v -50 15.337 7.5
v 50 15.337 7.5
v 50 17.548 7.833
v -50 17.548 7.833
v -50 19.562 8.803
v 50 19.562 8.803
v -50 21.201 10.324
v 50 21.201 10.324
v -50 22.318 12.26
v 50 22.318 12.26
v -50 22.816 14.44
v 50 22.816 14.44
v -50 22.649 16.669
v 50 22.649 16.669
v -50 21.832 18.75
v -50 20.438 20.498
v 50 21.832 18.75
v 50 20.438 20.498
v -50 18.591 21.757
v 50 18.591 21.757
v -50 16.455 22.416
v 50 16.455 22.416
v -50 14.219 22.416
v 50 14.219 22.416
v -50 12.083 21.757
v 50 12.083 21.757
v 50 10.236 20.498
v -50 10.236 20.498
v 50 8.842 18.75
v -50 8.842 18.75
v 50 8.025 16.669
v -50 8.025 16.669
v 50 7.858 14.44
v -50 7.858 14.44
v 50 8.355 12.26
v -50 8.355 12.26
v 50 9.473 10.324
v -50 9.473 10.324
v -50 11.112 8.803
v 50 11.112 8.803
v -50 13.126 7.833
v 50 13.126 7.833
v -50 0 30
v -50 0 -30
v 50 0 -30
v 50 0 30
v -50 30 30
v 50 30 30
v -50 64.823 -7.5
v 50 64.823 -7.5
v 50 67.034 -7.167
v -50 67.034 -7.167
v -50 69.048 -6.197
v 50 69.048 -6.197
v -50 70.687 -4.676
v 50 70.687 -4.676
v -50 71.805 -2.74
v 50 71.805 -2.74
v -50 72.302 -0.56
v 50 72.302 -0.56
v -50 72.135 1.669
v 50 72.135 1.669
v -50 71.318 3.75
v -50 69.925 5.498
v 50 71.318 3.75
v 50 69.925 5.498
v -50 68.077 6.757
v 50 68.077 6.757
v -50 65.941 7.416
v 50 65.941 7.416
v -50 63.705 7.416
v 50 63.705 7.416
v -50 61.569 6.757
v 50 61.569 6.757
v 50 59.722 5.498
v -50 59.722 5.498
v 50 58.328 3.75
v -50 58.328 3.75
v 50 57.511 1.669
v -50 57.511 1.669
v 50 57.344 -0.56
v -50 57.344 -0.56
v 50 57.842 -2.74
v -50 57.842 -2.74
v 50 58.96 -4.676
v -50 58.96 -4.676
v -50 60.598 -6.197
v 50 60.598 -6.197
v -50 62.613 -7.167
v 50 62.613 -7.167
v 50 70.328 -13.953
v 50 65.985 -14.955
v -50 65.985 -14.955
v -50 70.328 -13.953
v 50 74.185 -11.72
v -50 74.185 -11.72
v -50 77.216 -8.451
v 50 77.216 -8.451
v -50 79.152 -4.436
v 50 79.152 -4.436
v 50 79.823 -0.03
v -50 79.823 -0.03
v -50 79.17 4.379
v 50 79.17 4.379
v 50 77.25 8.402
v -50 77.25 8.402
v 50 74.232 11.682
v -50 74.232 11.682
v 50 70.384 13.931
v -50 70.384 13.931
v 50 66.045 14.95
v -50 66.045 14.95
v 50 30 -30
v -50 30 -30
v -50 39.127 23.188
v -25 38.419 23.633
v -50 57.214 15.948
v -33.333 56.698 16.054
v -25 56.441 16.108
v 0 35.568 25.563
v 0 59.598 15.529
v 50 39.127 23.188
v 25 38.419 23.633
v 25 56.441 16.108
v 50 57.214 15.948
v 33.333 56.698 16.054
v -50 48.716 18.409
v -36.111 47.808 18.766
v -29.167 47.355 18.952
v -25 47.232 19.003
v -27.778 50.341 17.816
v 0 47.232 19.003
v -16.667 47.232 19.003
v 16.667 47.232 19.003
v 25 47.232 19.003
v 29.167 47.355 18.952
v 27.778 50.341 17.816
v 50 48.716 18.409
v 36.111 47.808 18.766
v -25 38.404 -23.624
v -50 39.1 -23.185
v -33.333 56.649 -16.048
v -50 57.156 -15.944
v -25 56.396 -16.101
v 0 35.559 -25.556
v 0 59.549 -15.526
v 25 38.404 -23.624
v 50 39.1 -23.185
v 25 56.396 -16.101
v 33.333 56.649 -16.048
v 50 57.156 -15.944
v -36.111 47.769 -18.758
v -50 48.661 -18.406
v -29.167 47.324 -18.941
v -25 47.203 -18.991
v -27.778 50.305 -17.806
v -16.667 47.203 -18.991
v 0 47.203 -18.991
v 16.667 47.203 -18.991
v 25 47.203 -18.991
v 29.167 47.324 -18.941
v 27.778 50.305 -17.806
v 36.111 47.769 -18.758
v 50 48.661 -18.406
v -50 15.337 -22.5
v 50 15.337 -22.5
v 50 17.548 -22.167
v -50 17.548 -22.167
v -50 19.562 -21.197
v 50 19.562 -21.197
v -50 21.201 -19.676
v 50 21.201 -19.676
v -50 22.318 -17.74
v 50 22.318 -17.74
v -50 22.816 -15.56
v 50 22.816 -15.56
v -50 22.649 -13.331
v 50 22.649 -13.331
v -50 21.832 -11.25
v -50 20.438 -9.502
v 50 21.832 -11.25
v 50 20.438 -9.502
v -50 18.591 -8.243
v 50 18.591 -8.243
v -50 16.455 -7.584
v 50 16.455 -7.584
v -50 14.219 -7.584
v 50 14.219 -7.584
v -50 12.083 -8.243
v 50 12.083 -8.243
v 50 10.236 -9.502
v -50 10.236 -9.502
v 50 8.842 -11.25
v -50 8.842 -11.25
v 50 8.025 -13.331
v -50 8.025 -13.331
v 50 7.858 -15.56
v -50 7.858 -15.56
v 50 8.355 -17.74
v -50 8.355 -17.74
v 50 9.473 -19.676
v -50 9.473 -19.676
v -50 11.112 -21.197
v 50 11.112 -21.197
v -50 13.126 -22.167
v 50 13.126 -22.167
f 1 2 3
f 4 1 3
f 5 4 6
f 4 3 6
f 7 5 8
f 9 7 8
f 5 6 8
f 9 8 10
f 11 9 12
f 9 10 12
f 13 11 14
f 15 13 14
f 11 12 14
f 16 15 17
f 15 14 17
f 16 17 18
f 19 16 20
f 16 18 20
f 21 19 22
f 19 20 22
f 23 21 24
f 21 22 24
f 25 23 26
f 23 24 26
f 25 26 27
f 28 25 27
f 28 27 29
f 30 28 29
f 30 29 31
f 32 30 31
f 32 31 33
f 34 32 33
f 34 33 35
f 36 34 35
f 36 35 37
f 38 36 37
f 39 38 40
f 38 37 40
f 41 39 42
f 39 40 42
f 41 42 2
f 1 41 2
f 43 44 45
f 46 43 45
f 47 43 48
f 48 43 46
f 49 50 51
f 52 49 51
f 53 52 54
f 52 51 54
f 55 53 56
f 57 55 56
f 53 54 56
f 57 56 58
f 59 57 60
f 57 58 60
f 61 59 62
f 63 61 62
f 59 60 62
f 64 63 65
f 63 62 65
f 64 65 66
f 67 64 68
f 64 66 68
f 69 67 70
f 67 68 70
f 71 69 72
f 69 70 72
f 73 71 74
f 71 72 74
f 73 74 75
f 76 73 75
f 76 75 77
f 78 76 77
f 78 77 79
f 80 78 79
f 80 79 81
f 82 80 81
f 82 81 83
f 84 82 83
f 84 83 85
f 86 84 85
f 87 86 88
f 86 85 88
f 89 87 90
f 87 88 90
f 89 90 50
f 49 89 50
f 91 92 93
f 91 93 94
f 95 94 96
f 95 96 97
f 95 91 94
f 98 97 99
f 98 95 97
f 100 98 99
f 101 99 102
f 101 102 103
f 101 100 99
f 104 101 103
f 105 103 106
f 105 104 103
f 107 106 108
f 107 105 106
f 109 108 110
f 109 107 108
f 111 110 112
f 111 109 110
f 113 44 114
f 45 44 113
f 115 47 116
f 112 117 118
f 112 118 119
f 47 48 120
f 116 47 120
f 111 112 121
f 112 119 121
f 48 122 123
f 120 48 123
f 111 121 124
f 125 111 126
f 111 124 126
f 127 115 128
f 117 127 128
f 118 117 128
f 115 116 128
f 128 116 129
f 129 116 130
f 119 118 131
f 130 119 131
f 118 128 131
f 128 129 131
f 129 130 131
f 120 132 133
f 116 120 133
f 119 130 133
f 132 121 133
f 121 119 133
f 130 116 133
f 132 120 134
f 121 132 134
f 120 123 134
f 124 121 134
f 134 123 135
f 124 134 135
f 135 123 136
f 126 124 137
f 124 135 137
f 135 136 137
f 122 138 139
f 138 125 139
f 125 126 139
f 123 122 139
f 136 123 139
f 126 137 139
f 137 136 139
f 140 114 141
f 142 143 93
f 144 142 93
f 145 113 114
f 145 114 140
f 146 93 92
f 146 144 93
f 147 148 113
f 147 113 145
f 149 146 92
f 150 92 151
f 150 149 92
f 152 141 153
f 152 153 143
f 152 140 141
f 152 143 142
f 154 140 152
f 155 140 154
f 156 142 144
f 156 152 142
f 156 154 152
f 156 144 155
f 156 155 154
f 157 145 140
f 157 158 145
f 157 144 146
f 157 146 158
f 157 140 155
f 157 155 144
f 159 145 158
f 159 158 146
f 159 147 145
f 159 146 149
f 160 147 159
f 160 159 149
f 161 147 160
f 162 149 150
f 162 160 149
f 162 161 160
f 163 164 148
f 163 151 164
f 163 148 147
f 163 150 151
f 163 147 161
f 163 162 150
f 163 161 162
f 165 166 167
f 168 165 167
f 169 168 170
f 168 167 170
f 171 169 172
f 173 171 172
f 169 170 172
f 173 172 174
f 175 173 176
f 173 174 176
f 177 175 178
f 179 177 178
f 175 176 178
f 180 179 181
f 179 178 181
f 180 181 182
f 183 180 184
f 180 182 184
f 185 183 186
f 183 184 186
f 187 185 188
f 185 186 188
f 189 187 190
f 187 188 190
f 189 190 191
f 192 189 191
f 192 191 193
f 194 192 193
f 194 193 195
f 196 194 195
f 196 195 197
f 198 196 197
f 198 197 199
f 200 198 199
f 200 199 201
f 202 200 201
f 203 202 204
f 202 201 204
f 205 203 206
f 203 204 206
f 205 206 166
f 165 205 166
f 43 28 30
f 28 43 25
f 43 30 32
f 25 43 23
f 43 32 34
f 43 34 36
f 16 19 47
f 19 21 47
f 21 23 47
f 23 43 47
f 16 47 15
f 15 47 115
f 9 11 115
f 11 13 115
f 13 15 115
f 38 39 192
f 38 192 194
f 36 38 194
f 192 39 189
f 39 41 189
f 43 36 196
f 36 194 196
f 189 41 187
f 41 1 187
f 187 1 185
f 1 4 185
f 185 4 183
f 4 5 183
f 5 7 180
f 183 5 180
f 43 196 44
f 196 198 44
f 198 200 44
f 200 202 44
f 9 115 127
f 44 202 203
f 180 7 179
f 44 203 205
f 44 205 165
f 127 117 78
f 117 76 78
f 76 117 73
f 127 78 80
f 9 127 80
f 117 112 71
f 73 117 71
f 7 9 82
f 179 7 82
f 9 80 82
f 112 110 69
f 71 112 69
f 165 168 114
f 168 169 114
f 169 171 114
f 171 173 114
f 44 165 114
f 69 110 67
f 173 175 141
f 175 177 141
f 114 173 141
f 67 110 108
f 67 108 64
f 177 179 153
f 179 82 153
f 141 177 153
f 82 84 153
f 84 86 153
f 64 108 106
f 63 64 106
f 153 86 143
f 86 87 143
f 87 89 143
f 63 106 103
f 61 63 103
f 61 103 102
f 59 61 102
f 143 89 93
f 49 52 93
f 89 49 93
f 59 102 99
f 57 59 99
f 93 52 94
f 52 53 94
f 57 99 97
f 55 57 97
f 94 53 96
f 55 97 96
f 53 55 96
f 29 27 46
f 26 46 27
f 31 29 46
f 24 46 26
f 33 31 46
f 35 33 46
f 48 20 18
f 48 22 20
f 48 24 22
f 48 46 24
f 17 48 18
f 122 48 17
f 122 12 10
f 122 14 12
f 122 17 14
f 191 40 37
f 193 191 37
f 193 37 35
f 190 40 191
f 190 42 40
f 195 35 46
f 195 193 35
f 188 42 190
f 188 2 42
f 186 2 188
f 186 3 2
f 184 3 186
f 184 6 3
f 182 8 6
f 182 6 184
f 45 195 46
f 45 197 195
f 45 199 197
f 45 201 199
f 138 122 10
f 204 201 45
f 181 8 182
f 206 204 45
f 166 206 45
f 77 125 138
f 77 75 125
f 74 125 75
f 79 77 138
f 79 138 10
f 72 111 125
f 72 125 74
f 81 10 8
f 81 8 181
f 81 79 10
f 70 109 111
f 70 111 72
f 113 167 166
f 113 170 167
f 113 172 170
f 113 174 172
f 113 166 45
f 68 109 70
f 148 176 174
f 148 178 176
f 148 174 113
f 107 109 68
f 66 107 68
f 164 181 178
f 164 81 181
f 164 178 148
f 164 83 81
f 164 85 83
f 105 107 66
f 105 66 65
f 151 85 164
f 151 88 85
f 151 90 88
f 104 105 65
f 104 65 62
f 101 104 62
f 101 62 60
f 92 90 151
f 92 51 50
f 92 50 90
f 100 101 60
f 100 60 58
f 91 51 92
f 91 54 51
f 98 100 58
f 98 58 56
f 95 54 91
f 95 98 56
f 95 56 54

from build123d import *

# Parameters (mm, degrees)
SKETCH1_W           = 100
SKETCH1_H           = 60
BOSS_EXTRUDE1_DEPTH = 30
BOSS_EXTRUDE2_DEPTH = 100
SKETCH4_R           = 7.5
CUT_EXTRUDE1_DEPTH  = 100


with BuildPart() as part:
    # Sketch1 → Boss-Extrude1 (new body)
    with BuildSketch(Plane(origin=(0, 0, 0), x_dir=(1, 0, 0), z_dir=(0, 1, 0))):
        Rectangle(SKETCH1_W, SKETCH1_H)
    extrude(amount=BOSS_EXTRUDE1_DEPTH)

    # Sketch2 → Boss-Extrude2 (add)
    with BuildSketch(Plane(origin=(50, 0, 0), x_dir=(0, 0, -1), z_dir=(1, 0, 0))):
        with BuildLine():
            Line((-30, 30), (30, 30))
            add(Edge.make_bspline(
                [(30, 30), (15.504637598, 46.413049946), (14.954961798, 65.984799867)],
                knots=[0, 0, 0, 1, 1, 1], degree=2))
            ThreePointArc((14.954961798, 65.984799867), (0.029992259, 79.823254651), (-14.950197367, 66.044594871))
            add(Edge.make_bspline(
                [(-30, 30), (-15.530658632, 46.442080305), (-14.950197367, 66.044594871)],
                knots=[0, 0, 0, 1, 1, 1], degree=2))
        make_face()
    extrude(amount=-BOSS_EXTRUDE2_DEPTH)

    # Sketch4 → Cut-Extrude1 (cut)
    with BuildSketch(Plane(origin=(50, 0, 0), x_dir=(0, 0, -1), z_dir=(1, 0, 0))):
        with Locations((0, 64.823284635)):
            Circle(SKETCH4_R)
        with Locations((-15, 15.336875133)):
            Circle(SKETCH4_R)
        with Locations((15, 15.336875133)):
            Circle(SKETCH4_R)
    extrude(amount=-CUT_EXTRUDE1_DEPTH, mode=Mode.SUBTRACT)


solid = part.part
